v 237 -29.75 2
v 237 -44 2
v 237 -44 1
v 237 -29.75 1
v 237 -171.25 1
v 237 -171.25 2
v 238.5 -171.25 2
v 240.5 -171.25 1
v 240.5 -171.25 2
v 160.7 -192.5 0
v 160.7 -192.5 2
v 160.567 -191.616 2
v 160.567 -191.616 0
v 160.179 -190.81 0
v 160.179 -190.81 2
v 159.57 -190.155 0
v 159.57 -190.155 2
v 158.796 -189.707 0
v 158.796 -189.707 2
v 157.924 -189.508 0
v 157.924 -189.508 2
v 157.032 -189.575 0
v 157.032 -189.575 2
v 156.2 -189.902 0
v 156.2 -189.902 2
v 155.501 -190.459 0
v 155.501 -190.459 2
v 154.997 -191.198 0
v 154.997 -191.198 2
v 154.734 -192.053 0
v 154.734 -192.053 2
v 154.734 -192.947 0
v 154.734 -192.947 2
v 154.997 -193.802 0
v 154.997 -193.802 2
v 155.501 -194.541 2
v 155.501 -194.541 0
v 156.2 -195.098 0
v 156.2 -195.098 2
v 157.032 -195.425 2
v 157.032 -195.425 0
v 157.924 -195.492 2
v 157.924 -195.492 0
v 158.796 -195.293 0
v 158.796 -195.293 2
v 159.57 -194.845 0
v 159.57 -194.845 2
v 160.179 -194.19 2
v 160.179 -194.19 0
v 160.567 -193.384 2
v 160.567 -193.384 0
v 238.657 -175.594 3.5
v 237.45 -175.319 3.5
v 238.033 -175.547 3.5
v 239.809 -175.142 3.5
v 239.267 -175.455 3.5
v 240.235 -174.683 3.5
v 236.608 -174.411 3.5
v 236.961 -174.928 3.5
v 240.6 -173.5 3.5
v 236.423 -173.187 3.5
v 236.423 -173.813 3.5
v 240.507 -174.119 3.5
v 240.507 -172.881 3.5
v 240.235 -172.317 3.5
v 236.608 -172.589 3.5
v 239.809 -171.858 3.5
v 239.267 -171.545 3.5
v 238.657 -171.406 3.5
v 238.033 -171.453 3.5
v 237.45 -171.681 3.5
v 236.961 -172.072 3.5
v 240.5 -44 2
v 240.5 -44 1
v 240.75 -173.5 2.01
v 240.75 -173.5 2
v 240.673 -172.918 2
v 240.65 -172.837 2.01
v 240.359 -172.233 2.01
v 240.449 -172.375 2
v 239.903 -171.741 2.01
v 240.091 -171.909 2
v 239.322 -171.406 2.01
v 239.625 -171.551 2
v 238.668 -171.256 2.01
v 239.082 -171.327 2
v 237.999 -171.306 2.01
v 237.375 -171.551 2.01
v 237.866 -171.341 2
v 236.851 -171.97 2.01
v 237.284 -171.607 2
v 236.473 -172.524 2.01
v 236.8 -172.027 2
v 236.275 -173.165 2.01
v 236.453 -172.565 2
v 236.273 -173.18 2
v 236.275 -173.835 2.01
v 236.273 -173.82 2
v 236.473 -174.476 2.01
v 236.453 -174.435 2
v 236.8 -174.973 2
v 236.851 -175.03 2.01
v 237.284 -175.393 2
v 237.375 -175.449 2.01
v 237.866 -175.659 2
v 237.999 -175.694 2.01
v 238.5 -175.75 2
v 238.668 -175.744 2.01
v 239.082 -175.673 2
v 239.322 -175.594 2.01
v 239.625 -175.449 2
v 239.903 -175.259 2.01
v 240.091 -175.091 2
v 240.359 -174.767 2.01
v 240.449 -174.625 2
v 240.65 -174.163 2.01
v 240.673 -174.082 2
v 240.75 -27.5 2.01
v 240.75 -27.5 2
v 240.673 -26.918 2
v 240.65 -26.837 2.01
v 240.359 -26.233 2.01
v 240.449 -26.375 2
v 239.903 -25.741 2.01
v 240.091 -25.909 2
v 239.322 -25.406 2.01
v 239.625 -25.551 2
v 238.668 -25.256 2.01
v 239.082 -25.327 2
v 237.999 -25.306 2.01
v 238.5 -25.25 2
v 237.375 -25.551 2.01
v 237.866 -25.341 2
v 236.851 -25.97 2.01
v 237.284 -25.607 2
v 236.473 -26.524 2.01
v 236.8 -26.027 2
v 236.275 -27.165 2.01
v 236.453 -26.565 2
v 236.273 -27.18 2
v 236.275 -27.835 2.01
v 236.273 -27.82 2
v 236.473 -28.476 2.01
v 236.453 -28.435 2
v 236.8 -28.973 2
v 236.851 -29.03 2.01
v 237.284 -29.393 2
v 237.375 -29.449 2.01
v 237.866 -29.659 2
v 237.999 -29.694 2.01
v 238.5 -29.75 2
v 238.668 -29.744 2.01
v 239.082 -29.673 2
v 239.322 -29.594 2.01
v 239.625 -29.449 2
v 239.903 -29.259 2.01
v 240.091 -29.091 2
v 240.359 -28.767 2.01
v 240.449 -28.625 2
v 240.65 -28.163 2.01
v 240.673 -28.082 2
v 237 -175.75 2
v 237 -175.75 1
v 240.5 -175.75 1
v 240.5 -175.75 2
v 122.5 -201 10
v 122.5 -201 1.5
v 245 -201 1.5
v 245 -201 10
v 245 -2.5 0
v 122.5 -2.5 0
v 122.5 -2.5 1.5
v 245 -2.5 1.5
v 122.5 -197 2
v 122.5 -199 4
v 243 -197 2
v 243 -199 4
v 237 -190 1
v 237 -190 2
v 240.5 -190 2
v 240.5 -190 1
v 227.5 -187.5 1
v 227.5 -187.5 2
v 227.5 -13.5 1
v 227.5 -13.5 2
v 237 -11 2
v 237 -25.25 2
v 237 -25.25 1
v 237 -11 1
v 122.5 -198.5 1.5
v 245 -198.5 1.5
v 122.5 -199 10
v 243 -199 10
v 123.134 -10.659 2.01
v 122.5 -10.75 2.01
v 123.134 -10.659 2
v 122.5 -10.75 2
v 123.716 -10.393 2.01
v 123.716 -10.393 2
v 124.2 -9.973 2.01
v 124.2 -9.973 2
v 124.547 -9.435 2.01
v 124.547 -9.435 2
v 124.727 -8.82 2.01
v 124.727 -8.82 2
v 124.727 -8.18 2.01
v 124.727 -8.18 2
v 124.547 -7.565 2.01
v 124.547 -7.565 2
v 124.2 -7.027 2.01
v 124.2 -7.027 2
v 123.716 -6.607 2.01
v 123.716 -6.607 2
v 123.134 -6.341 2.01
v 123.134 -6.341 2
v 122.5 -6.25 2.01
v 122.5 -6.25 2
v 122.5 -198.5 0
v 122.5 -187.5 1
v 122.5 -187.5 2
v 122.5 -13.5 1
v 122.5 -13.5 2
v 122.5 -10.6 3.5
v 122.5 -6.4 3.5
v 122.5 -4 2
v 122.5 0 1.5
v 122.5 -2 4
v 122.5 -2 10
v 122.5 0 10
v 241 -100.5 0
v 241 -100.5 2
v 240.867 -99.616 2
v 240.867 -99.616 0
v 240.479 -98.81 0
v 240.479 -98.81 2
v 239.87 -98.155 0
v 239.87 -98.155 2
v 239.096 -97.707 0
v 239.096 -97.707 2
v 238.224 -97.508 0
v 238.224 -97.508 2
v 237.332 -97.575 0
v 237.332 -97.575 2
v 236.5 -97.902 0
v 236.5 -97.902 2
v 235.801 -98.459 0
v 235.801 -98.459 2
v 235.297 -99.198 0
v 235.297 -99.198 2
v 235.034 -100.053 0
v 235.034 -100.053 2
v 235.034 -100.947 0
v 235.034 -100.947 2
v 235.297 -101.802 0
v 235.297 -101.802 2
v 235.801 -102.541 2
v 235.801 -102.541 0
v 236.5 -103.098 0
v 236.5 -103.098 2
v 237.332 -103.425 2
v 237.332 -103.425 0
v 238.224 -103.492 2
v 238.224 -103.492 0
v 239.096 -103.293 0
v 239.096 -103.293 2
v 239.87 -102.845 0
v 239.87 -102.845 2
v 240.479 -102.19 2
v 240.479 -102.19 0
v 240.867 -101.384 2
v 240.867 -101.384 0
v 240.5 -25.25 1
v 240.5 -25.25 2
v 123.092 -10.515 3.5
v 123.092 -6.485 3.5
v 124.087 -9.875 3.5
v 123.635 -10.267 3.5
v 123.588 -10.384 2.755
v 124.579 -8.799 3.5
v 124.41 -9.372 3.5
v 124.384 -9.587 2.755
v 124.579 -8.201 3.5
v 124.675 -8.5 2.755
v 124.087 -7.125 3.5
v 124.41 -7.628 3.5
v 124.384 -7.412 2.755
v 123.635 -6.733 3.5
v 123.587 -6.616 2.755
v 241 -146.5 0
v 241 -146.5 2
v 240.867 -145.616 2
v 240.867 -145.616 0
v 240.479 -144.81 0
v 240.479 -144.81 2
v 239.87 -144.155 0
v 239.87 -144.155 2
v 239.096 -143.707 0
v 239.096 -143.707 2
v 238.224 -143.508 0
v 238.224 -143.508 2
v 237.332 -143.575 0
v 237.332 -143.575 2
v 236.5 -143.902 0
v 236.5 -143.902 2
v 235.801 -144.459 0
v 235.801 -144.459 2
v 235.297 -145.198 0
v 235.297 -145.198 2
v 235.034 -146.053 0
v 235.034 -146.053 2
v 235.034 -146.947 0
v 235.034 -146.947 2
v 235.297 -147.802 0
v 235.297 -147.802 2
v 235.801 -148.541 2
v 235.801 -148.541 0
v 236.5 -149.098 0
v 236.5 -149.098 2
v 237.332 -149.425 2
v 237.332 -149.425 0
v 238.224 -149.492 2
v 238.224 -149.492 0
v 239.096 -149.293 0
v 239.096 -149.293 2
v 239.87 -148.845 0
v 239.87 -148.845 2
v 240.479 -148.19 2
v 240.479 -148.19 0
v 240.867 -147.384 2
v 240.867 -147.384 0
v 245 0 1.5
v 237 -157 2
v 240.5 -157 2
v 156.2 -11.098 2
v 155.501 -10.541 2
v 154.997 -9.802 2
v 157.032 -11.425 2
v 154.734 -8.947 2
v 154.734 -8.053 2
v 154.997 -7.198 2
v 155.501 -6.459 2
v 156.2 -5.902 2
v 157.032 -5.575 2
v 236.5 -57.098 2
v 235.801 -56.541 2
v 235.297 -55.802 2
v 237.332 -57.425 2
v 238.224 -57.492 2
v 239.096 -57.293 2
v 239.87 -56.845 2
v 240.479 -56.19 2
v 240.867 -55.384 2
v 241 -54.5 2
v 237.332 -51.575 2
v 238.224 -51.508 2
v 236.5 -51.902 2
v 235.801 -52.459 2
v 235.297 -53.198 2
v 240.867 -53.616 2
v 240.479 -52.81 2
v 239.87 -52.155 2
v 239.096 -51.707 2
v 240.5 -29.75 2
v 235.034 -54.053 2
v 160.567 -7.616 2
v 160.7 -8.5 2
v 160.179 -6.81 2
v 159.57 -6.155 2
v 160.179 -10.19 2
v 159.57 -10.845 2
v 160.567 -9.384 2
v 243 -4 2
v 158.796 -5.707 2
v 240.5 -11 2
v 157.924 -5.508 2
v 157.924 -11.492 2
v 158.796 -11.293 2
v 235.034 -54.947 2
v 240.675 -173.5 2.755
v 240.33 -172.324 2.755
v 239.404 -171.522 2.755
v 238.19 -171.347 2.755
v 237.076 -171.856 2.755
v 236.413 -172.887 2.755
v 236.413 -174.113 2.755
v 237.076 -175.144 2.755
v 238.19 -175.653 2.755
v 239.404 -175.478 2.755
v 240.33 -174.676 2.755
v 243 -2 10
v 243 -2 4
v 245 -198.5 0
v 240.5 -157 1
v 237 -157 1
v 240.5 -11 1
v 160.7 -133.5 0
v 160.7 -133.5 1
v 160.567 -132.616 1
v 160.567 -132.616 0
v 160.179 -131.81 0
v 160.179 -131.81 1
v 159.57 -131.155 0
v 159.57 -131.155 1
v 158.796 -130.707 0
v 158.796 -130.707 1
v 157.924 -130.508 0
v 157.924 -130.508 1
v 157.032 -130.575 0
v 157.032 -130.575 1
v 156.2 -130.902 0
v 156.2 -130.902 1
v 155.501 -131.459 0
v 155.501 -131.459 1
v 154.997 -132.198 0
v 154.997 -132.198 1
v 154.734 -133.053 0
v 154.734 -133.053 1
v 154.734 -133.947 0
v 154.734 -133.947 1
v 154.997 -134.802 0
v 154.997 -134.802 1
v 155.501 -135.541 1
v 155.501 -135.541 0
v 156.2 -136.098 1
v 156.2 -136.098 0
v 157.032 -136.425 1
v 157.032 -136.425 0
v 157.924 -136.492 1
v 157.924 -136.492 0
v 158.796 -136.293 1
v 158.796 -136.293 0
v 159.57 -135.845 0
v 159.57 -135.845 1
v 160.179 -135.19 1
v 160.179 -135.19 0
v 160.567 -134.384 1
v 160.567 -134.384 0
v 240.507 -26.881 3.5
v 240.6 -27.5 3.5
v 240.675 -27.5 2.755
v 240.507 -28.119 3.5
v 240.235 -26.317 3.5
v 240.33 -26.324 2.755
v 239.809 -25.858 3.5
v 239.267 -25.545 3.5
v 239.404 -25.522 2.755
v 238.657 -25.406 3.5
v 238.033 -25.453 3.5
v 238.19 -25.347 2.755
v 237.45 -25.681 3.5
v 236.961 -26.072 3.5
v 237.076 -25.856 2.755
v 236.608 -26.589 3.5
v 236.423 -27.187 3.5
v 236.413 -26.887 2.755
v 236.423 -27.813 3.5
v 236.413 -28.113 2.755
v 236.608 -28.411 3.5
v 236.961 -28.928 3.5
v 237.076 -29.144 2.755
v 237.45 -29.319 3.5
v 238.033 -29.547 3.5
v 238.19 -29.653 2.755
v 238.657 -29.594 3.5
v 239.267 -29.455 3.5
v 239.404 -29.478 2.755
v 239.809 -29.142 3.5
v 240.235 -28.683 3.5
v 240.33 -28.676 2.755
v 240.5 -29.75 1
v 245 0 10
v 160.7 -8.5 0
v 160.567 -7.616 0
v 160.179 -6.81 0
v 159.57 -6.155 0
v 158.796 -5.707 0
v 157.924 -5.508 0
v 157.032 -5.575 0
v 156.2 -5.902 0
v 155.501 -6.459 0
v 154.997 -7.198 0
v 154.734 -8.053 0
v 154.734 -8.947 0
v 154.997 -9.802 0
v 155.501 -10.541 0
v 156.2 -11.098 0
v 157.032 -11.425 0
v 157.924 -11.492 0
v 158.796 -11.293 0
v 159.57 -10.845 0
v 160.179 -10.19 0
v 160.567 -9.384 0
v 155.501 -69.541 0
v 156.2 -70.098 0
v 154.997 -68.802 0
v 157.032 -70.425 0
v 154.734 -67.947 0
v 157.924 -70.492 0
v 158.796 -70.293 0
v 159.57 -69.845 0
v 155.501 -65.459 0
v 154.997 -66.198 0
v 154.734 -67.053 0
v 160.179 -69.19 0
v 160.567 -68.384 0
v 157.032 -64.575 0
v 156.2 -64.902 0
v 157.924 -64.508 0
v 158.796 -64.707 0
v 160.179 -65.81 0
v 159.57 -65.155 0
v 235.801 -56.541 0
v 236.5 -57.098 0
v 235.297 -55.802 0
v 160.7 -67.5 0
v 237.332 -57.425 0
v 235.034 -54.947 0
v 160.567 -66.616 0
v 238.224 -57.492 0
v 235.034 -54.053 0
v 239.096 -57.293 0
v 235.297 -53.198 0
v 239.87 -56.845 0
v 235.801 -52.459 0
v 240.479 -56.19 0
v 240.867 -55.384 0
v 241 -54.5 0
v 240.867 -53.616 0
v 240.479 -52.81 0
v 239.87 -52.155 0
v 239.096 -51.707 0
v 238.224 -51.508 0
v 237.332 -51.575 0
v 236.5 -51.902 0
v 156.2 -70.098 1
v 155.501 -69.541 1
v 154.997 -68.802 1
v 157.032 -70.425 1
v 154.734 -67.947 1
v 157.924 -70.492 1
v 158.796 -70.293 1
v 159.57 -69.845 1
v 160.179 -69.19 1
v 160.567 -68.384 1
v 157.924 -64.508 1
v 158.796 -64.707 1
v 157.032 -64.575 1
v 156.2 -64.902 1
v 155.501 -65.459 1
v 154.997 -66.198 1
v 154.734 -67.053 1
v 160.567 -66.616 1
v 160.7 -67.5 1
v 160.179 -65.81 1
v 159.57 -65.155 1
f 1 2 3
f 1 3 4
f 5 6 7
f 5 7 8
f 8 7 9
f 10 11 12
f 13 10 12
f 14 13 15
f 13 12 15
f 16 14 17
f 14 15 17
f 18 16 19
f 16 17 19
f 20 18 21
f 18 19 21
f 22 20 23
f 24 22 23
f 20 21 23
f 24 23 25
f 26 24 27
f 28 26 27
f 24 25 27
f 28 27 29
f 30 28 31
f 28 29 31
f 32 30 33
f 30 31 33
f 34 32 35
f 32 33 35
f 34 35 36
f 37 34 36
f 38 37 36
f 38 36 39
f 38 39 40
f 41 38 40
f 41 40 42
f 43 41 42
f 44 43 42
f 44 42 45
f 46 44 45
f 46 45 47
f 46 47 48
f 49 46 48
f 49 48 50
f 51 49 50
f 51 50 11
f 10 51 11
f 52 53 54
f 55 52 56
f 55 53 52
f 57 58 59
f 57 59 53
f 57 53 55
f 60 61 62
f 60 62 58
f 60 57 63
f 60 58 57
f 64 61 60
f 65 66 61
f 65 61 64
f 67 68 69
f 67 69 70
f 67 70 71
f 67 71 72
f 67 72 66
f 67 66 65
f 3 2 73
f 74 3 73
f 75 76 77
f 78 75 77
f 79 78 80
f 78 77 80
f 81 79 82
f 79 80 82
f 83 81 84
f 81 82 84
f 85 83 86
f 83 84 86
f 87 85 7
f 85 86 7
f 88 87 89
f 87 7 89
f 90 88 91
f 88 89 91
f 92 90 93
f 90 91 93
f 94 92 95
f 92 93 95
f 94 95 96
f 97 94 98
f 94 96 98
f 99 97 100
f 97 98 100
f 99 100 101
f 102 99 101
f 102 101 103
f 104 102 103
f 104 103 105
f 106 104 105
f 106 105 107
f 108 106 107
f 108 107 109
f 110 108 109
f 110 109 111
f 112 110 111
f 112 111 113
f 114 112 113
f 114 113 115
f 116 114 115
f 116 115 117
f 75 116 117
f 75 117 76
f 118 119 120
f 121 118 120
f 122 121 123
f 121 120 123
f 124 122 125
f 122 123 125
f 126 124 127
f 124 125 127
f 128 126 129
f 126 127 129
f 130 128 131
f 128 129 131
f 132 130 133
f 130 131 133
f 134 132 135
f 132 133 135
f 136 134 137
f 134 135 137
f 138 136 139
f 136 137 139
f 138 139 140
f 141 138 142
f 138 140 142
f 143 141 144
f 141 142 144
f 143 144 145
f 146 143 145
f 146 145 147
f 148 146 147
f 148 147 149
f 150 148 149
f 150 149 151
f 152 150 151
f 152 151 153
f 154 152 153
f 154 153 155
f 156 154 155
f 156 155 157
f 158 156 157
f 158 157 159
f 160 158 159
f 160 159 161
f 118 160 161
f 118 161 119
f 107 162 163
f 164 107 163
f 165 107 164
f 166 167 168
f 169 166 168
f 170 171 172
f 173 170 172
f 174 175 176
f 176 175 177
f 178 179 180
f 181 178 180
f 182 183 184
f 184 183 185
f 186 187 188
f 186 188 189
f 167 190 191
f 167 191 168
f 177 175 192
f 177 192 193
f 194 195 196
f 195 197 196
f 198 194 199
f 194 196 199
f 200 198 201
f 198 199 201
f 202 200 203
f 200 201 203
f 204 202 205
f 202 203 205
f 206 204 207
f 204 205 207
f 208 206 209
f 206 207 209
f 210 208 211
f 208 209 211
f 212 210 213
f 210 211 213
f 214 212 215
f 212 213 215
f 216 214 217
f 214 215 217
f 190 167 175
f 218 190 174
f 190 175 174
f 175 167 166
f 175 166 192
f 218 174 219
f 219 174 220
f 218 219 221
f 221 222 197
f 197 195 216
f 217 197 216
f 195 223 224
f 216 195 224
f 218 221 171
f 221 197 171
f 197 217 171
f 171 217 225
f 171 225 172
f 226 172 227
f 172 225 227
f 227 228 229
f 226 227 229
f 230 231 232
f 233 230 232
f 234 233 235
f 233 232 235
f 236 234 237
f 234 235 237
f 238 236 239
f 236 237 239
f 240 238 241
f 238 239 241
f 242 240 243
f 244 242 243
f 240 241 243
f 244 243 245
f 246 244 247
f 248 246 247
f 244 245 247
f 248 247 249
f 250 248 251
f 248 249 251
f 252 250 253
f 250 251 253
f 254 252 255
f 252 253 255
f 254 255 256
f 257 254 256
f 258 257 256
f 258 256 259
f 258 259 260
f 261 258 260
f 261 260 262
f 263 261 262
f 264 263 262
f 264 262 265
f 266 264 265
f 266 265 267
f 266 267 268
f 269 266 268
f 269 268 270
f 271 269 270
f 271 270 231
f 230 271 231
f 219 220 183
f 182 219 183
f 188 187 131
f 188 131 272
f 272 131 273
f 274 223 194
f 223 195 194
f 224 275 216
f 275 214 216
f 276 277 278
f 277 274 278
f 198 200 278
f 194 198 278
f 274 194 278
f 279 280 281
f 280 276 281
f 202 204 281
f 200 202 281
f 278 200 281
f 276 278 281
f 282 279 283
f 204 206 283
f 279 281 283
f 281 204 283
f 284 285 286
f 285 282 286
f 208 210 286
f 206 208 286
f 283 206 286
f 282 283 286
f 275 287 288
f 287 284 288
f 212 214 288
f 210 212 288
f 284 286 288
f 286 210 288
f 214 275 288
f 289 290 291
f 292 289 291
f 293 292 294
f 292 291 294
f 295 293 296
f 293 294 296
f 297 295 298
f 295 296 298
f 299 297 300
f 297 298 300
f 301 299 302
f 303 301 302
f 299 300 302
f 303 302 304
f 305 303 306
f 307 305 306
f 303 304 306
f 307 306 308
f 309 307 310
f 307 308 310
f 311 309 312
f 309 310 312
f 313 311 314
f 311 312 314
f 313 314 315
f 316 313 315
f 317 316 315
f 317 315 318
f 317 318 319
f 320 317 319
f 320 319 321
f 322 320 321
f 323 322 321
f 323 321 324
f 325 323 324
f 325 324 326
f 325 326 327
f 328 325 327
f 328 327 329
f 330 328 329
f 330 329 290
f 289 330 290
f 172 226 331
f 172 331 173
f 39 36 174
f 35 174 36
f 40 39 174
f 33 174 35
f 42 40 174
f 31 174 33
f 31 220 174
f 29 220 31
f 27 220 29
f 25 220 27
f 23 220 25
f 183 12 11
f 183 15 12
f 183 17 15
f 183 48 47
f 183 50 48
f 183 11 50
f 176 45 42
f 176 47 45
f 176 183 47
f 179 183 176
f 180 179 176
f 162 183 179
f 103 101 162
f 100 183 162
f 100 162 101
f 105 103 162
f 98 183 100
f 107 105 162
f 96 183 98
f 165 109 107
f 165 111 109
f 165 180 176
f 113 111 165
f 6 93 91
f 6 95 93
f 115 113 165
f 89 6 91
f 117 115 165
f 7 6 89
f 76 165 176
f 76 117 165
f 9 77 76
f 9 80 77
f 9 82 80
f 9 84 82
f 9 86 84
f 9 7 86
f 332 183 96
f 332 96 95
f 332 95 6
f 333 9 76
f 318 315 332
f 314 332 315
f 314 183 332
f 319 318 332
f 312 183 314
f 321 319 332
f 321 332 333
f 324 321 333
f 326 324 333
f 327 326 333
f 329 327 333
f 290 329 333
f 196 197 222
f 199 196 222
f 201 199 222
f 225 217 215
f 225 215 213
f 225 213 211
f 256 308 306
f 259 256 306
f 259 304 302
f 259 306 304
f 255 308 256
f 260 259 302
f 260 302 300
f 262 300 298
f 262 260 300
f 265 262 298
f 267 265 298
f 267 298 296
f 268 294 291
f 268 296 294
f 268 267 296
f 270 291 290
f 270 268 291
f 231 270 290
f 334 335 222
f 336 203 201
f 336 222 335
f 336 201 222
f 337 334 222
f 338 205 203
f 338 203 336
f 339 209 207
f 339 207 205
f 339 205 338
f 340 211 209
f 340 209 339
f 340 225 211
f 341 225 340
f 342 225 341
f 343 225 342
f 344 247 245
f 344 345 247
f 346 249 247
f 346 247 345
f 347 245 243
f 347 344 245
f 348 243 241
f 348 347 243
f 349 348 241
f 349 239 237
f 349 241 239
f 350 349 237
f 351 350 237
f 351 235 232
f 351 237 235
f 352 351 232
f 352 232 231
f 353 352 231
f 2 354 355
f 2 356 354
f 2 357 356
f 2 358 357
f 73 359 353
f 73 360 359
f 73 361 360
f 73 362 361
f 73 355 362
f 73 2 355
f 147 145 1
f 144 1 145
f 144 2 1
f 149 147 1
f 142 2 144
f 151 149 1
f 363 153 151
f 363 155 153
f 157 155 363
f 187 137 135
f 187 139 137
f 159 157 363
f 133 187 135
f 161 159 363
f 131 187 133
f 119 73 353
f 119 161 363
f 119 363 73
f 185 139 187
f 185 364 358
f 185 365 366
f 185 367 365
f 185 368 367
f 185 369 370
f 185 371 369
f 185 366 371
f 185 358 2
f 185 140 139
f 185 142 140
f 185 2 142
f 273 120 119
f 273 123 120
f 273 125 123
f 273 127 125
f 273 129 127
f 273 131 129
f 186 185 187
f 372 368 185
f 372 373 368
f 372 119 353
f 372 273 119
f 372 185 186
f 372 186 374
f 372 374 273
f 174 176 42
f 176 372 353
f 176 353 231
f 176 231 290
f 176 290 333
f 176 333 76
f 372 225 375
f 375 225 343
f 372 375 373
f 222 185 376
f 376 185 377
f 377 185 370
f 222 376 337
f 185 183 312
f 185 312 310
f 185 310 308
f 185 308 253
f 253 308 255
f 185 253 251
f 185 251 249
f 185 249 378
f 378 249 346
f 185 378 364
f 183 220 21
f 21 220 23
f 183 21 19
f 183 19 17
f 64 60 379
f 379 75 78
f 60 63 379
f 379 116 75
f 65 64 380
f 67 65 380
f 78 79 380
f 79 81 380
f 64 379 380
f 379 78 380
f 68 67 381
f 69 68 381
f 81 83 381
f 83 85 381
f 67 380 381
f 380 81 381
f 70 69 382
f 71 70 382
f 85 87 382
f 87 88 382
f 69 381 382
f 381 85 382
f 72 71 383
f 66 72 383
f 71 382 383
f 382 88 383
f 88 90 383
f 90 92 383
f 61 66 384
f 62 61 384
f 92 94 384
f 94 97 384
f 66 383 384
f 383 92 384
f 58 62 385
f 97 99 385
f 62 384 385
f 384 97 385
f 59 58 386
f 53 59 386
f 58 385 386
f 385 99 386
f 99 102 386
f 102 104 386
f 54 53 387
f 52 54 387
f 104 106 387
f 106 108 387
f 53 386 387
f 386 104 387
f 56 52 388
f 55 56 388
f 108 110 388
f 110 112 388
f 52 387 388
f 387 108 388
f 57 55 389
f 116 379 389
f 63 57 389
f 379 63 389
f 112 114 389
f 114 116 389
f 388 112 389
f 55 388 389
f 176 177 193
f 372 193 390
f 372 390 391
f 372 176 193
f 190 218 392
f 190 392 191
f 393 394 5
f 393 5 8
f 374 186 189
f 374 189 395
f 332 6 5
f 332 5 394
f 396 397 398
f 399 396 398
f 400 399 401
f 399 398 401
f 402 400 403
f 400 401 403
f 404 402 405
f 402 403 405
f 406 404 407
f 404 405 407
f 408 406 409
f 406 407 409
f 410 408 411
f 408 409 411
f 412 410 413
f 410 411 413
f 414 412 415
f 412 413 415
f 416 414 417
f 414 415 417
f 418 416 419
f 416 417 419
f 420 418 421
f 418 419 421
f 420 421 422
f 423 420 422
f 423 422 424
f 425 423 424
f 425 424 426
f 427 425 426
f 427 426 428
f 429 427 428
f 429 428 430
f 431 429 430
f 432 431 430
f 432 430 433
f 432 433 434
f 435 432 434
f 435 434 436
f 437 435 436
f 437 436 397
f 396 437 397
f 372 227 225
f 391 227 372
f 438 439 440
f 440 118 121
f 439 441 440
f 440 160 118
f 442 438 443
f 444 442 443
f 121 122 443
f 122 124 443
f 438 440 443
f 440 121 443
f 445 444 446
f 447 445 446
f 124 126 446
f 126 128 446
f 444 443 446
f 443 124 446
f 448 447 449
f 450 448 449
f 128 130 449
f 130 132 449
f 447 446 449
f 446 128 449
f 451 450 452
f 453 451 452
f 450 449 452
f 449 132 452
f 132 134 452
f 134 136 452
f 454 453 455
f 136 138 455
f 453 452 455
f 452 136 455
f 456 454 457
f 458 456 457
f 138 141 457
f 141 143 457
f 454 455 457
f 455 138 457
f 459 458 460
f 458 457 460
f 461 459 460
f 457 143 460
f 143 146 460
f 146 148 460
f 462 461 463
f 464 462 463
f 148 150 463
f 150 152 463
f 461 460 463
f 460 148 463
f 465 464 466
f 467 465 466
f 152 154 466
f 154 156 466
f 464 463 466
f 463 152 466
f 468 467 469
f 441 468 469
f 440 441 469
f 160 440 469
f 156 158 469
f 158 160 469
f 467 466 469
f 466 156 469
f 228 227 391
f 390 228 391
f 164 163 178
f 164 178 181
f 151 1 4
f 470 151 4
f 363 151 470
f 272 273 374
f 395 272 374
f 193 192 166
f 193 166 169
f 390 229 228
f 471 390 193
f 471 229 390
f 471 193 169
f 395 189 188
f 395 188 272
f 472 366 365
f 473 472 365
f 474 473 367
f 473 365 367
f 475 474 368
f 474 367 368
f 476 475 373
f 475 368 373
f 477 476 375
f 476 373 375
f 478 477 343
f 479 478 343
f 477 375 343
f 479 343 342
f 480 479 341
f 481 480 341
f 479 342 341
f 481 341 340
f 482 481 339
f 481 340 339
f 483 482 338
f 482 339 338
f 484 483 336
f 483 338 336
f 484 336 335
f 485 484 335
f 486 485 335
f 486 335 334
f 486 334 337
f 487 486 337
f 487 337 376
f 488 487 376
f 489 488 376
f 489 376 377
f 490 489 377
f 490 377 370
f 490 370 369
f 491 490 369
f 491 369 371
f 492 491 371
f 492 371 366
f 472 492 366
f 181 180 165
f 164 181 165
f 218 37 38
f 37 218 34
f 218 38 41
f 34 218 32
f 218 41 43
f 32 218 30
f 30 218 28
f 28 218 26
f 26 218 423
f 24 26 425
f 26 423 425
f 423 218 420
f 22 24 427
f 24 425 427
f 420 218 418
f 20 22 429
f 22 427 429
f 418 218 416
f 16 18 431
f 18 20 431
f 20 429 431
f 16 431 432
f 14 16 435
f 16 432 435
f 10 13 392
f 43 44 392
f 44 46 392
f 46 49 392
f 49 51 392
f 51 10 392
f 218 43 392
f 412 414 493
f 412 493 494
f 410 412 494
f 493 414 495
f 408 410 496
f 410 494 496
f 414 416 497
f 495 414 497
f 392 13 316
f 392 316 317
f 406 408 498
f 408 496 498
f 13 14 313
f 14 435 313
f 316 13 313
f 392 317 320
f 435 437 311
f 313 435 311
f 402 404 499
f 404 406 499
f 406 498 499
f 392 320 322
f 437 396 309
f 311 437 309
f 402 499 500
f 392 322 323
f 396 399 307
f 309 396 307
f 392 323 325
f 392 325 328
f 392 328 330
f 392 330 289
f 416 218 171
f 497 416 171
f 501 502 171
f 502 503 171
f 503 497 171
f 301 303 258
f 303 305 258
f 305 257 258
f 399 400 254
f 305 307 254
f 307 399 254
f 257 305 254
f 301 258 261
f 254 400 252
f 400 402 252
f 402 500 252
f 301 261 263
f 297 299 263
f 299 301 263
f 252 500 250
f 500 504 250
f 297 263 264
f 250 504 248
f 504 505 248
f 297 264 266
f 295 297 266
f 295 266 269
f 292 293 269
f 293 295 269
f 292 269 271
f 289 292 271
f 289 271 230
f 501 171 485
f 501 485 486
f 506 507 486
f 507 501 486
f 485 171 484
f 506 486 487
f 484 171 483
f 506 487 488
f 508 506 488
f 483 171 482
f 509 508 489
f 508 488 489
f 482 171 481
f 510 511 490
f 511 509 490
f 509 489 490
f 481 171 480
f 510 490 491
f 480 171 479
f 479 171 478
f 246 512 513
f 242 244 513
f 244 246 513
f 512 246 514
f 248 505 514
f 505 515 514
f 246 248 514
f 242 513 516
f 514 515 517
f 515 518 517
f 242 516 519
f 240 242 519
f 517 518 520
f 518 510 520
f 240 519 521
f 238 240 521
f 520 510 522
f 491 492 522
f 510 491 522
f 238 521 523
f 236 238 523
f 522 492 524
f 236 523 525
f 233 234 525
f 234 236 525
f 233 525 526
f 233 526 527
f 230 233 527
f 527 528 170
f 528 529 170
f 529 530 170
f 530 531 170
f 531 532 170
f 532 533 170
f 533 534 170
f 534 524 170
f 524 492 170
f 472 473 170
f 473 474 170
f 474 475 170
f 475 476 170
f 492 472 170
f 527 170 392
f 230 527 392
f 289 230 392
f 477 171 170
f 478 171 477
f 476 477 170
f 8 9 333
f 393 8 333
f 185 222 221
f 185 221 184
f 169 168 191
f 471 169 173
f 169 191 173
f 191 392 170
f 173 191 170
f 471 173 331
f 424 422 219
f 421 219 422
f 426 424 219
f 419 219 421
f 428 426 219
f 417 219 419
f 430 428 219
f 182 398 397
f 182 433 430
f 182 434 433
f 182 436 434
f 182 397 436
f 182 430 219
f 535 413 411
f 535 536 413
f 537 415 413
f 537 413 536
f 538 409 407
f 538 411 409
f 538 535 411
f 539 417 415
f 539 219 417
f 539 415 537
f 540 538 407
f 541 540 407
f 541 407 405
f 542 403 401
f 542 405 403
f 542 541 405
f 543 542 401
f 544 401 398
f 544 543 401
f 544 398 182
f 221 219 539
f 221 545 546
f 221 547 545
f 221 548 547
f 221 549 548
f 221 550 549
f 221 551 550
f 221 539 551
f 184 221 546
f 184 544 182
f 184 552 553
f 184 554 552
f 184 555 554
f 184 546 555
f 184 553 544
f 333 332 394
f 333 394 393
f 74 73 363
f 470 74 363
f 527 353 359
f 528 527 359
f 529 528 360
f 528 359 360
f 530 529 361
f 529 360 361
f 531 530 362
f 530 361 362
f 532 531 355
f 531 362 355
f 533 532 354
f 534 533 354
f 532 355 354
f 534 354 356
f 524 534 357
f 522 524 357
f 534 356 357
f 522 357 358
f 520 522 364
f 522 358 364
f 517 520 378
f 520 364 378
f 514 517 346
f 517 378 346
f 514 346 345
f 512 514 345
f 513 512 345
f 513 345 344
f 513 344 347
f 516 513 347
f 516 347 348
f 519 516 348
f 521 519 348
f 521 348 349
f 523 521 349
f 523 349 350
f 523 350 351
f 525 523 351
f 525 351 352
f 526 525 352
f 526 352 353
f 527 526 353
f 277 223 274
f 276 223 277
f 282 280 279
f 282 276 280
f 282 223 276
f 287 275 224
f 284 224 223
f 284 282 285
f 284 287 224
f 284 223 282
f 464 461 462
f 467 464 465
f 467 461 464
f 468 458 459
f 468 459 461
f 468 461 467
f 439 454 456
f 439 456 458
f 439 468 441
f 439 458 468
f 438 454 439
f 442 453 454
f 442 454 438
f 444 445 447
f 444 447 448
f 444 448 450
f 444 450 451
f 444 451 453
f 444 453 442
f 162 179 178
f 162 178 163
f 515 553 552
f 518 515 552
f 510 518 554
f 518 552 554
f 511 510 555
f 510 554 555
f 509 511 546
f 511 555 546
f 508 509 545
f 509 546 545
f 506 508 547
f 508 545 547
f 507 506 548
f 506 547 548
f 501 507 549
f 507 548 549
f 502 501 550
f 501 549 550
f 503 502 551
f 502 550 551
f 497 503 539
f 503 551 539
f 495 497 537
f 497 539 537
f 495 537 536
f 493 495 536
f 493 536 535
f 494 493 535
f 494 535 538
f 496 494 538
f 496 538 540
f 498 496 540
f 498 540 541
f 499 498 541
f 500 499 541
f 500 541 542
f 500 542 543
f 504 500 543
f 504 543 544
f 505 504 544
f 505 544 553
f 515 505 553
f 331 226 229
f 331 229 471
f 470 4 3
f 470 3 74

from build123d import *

# Parameters (mm, degrees)
F0_W        = 245
F0_H        = 201
F1_DEPTH    = 8
F2_T        = -2
F3_W        = 210
F3_H        = 174
F4_DEPTH    = 1
F5_W        = 3.5
F5_H        = 33
F6_DEPTH    = 1
F8_W        = 3.5
F8_H        = 4.5
F9_DEPTH    = 1
F10_R       = 2.25
F11_DEPTH   = 1.5
F12_SIZE2   = 1.4896513151
F12_SIZE    = 0.15
F12_2_SIZE2 = 1.4896513151
F12_2_SIZE  = 0.15
F12_3_SIZE2 = 1.4896513151
F12_3_SIZE  = 0.15
F12_4_SIZE2 = 1.4896513151
F12_4_SIZE  = 0.15
F12_5_SIZE2 = 1.4896513151
F12_5_SIZE  = 0.15
F13_R       = 3
F14_DEPTH   = 2.001
F15_W       = 2.5
F15_H       = 1.5
F16_DEPTH   = 245.001
F17_SIZE    = 2
F18_DEPTH   = 2
F19_W       = 141.9361917675
F19_H       = 219.9546247721
F20_DEPTH   = 10.001


with BuildPart() as f1:
    # F0 (on Top) → F1 (new body)
    with BuildSketch(Plane.XY):
        with Locations((122.5, -100.5)):
            Rectangle(F0_W, F0_H)
    extrude(amount=F1_DEPTH)

    # F2
    f2_openings = [f1.faces().sort_by_distance(p)[0] for p in [
        (122.5, -100.5, 8),
    ]]
    offset(amount=F2_T, openings=f2_openings)

    # F3 (on face) → F4 (cut)
    with BuildSketch(Plane.XY.offset(2)):
        with Locations((122.5, -100.5)):
            Rectangle(F3_W, F3_H)
    extrude(amount=-F4_DEPTH, mode=Mode.SUBTRACT)

    # F5 (on face) → F6 (cut)
    with BuildSketch(Plane.XY.offset(2)):
        with Locations((6.25, -27.5)):
            Rectangle(F5_W, F5_H)
        with Locations((6.25, -173.5)):
            Rectangle(F5_W, F5_H)
        with Locations((238.75, -27.5)):
            Rectangle(F5_W, F5_H)
        with Locations((238.75, -173.5)):
            Rectangle(F5_W, F5_H)
    extrude(amount=-F6_DEPTH, mode=Mode.SUBTRACT)

    # F8 (on face) → F9 (join)
    with BuildSketch(Plane.XY.offset(2)):
        with Locations((238.75, -173.5)):
            Rectangle(F8_W, F8_H)
        with Locations((238.75, -27.5)):
            Rectangle(F8_W, F8_H)
        with Locations((6.25, -27.5)):
            Rectangle(F8_W, F8_H)
        with Locations((6.25, -173.5)):
            Rectangle(F8_W, F8_H)
    extrude(amount=-F9_DEPTH)

    # F10 (on face) → F11 (join)
    with BuildSketch(Plane.XY.offset(2)):
        with Locations((238.5, -27.5)):
            Circle(F10_R)
        with Locations((6.5, -27.5)):
            Circle(F10_R)
        with Locations((6.5, -173.5)):
            Circle(F10_R)
        with Locations((238.5, -173.5)):
            Circle(F10_R)
        with Locations((122.5, -8.5)):
            Circle(F10_R)
    extrude(amount=F11_DEPTH)

    # F12
    f12_edges = [f1.edges().sort_by_distance(p)[0] for p in [
        (236.25, -173.5, 3.5),
    ]]
    f12_side = f1.faces().sort_by_distance((238.5, -173.5, 3.5))[0]
    chamfer(f12_edges, length=F12_SIZE, length2=F12_SIZE2, reference=f12_side)

    # F12#2
    f12_2_edges = [f1.edges().sort_by_distance(p)[0] for p in [
        (4.25, -173.5, 3.5),
    ]]
    f12_2_side = f1.faces().sort_by_distance((6.5, -173.5, 3.5))[0]
    chamfer(f12_2_edges, length=F12_2_SIZE, length2=F12_2_SIZE2, reference=f12_2_side)

    # F12#3
    f12_3_edges = [f1.edges().sort_by_distance(p)[0] for p in [
        (236.25, -27.5, 3.5),
    ]]
    f12_3_side = f1.faces().sort_by_distance((238.5, -27.5, 3.5))[0]
    chamfer(f12_3_edges, length=F12_3_SIZE, length2=F12_3_SIZE2, reference=f12_3_side)

    # F12#4
    f12_4_edges = [f1.edges().sort_by_distance(p)[0] for p in [
        (4.25, -27.5, 3.5),
    ]]
    f12_4_side = f1.faces().sort_by_distance((6.5, -27.5, 3.5))[0]
    chamfer(f12_4_edges, length=F12_4_SIZE, length2=F12_4_SIZE2, reference=f12_4_side)

    # F12#5
    f12_5_edges = [f1.edges().sort_by_distance(p)[0] for p in [
        (120.25, -8.5, 3.5),
    ]]
    f12_5_side = f1.faces().sort_by_distance((122.5, -8.5, 3.5))[0]
    chamfer(f12_5_edges, length=F12_5_SIZE, length2=F12_5_SIZE2, reference=f12_5_side)

    # F13 (on face) → F14 (cut, through all)
    with BuildSketch(Plane.XY.offset(2)):
        with Locations((7, -54.5)):
            Circle(F13_R)
        with Locations((7, -100.5)):
            Circle(F13_R)
        with Locations((7, -146.5)):
            Circle(F13_R)
        with Locations((238, -54.5)):
            Circle(F13_R)
        with Locations((238, -100.5)):
            Circle(F13_R)
        with Locations((238, -146.5)):
            Circle(F13_R)
        with Locations((87.3, -8.5)):
            Circle(F13_R)
        with Locations((87.3, -67.5)):
            Circle(F13_R)
        with Locations((157.7, -8.5)):
            Circle(F13_R)
        with Locations((157.7, -67.5)):
            Circle(F13_R)
        with Locations((157.7, -133.5)):
            Circle(F13_R)
        with Locations((157.7, -192.5)):
            Circle(F13_R)
        with Locations((87.3, -192.5)):
            Circle(F13_R)
        with Locations((87.3, -133.5)):
            Circle(F13_R)
    extrude(amount=-F14_DEPTH, mode=Mode.SUBTRACT)

    # F15 (on face) → F16 (cut, through all)
    with BuildSketch(Plane(origin=(0, 0, 0), x_dir=(0, -1, 0), z_dir=(-1, 0, 0))):
        with Locations((1.25, 0.75)):
            Rectangle(F15_W, F15_H)
        with Locations((199.75, 0.75)):
            Rectangle(F15_W, F15_H)
    extrude(amount=-F16_DEPTH, mode=Mode.SUBTRACT)

    # F17
    f17_edges = [f1.edges().sort_by_distance(p)[0] for p in [
        (122.5, -2, 2),
        (122.5, -199, 2),
    ]]
    chamfer(f17_edges, length=F17_SIZE)

    # F18 (add): a face of the model
    f18_faces = [f1.faces().sort_by_distance(p)[0] for p in [
        (122.5, -0.3169006153, 8),
    ]]
    extrude(f18_faces, amount=F18_DEPTH)

    # F19 (on face) → F20 (cut, through all)
    with BuildSketch(Plane.XY.offset(10)):
        with Locations((51.5319041163, -105.3685471416)):
            Rectangle(F19_W, F19_H)
    extrude(amount=-F20_DEPTH, mode=Mode.SUBTRACT)


solid = f1.part
